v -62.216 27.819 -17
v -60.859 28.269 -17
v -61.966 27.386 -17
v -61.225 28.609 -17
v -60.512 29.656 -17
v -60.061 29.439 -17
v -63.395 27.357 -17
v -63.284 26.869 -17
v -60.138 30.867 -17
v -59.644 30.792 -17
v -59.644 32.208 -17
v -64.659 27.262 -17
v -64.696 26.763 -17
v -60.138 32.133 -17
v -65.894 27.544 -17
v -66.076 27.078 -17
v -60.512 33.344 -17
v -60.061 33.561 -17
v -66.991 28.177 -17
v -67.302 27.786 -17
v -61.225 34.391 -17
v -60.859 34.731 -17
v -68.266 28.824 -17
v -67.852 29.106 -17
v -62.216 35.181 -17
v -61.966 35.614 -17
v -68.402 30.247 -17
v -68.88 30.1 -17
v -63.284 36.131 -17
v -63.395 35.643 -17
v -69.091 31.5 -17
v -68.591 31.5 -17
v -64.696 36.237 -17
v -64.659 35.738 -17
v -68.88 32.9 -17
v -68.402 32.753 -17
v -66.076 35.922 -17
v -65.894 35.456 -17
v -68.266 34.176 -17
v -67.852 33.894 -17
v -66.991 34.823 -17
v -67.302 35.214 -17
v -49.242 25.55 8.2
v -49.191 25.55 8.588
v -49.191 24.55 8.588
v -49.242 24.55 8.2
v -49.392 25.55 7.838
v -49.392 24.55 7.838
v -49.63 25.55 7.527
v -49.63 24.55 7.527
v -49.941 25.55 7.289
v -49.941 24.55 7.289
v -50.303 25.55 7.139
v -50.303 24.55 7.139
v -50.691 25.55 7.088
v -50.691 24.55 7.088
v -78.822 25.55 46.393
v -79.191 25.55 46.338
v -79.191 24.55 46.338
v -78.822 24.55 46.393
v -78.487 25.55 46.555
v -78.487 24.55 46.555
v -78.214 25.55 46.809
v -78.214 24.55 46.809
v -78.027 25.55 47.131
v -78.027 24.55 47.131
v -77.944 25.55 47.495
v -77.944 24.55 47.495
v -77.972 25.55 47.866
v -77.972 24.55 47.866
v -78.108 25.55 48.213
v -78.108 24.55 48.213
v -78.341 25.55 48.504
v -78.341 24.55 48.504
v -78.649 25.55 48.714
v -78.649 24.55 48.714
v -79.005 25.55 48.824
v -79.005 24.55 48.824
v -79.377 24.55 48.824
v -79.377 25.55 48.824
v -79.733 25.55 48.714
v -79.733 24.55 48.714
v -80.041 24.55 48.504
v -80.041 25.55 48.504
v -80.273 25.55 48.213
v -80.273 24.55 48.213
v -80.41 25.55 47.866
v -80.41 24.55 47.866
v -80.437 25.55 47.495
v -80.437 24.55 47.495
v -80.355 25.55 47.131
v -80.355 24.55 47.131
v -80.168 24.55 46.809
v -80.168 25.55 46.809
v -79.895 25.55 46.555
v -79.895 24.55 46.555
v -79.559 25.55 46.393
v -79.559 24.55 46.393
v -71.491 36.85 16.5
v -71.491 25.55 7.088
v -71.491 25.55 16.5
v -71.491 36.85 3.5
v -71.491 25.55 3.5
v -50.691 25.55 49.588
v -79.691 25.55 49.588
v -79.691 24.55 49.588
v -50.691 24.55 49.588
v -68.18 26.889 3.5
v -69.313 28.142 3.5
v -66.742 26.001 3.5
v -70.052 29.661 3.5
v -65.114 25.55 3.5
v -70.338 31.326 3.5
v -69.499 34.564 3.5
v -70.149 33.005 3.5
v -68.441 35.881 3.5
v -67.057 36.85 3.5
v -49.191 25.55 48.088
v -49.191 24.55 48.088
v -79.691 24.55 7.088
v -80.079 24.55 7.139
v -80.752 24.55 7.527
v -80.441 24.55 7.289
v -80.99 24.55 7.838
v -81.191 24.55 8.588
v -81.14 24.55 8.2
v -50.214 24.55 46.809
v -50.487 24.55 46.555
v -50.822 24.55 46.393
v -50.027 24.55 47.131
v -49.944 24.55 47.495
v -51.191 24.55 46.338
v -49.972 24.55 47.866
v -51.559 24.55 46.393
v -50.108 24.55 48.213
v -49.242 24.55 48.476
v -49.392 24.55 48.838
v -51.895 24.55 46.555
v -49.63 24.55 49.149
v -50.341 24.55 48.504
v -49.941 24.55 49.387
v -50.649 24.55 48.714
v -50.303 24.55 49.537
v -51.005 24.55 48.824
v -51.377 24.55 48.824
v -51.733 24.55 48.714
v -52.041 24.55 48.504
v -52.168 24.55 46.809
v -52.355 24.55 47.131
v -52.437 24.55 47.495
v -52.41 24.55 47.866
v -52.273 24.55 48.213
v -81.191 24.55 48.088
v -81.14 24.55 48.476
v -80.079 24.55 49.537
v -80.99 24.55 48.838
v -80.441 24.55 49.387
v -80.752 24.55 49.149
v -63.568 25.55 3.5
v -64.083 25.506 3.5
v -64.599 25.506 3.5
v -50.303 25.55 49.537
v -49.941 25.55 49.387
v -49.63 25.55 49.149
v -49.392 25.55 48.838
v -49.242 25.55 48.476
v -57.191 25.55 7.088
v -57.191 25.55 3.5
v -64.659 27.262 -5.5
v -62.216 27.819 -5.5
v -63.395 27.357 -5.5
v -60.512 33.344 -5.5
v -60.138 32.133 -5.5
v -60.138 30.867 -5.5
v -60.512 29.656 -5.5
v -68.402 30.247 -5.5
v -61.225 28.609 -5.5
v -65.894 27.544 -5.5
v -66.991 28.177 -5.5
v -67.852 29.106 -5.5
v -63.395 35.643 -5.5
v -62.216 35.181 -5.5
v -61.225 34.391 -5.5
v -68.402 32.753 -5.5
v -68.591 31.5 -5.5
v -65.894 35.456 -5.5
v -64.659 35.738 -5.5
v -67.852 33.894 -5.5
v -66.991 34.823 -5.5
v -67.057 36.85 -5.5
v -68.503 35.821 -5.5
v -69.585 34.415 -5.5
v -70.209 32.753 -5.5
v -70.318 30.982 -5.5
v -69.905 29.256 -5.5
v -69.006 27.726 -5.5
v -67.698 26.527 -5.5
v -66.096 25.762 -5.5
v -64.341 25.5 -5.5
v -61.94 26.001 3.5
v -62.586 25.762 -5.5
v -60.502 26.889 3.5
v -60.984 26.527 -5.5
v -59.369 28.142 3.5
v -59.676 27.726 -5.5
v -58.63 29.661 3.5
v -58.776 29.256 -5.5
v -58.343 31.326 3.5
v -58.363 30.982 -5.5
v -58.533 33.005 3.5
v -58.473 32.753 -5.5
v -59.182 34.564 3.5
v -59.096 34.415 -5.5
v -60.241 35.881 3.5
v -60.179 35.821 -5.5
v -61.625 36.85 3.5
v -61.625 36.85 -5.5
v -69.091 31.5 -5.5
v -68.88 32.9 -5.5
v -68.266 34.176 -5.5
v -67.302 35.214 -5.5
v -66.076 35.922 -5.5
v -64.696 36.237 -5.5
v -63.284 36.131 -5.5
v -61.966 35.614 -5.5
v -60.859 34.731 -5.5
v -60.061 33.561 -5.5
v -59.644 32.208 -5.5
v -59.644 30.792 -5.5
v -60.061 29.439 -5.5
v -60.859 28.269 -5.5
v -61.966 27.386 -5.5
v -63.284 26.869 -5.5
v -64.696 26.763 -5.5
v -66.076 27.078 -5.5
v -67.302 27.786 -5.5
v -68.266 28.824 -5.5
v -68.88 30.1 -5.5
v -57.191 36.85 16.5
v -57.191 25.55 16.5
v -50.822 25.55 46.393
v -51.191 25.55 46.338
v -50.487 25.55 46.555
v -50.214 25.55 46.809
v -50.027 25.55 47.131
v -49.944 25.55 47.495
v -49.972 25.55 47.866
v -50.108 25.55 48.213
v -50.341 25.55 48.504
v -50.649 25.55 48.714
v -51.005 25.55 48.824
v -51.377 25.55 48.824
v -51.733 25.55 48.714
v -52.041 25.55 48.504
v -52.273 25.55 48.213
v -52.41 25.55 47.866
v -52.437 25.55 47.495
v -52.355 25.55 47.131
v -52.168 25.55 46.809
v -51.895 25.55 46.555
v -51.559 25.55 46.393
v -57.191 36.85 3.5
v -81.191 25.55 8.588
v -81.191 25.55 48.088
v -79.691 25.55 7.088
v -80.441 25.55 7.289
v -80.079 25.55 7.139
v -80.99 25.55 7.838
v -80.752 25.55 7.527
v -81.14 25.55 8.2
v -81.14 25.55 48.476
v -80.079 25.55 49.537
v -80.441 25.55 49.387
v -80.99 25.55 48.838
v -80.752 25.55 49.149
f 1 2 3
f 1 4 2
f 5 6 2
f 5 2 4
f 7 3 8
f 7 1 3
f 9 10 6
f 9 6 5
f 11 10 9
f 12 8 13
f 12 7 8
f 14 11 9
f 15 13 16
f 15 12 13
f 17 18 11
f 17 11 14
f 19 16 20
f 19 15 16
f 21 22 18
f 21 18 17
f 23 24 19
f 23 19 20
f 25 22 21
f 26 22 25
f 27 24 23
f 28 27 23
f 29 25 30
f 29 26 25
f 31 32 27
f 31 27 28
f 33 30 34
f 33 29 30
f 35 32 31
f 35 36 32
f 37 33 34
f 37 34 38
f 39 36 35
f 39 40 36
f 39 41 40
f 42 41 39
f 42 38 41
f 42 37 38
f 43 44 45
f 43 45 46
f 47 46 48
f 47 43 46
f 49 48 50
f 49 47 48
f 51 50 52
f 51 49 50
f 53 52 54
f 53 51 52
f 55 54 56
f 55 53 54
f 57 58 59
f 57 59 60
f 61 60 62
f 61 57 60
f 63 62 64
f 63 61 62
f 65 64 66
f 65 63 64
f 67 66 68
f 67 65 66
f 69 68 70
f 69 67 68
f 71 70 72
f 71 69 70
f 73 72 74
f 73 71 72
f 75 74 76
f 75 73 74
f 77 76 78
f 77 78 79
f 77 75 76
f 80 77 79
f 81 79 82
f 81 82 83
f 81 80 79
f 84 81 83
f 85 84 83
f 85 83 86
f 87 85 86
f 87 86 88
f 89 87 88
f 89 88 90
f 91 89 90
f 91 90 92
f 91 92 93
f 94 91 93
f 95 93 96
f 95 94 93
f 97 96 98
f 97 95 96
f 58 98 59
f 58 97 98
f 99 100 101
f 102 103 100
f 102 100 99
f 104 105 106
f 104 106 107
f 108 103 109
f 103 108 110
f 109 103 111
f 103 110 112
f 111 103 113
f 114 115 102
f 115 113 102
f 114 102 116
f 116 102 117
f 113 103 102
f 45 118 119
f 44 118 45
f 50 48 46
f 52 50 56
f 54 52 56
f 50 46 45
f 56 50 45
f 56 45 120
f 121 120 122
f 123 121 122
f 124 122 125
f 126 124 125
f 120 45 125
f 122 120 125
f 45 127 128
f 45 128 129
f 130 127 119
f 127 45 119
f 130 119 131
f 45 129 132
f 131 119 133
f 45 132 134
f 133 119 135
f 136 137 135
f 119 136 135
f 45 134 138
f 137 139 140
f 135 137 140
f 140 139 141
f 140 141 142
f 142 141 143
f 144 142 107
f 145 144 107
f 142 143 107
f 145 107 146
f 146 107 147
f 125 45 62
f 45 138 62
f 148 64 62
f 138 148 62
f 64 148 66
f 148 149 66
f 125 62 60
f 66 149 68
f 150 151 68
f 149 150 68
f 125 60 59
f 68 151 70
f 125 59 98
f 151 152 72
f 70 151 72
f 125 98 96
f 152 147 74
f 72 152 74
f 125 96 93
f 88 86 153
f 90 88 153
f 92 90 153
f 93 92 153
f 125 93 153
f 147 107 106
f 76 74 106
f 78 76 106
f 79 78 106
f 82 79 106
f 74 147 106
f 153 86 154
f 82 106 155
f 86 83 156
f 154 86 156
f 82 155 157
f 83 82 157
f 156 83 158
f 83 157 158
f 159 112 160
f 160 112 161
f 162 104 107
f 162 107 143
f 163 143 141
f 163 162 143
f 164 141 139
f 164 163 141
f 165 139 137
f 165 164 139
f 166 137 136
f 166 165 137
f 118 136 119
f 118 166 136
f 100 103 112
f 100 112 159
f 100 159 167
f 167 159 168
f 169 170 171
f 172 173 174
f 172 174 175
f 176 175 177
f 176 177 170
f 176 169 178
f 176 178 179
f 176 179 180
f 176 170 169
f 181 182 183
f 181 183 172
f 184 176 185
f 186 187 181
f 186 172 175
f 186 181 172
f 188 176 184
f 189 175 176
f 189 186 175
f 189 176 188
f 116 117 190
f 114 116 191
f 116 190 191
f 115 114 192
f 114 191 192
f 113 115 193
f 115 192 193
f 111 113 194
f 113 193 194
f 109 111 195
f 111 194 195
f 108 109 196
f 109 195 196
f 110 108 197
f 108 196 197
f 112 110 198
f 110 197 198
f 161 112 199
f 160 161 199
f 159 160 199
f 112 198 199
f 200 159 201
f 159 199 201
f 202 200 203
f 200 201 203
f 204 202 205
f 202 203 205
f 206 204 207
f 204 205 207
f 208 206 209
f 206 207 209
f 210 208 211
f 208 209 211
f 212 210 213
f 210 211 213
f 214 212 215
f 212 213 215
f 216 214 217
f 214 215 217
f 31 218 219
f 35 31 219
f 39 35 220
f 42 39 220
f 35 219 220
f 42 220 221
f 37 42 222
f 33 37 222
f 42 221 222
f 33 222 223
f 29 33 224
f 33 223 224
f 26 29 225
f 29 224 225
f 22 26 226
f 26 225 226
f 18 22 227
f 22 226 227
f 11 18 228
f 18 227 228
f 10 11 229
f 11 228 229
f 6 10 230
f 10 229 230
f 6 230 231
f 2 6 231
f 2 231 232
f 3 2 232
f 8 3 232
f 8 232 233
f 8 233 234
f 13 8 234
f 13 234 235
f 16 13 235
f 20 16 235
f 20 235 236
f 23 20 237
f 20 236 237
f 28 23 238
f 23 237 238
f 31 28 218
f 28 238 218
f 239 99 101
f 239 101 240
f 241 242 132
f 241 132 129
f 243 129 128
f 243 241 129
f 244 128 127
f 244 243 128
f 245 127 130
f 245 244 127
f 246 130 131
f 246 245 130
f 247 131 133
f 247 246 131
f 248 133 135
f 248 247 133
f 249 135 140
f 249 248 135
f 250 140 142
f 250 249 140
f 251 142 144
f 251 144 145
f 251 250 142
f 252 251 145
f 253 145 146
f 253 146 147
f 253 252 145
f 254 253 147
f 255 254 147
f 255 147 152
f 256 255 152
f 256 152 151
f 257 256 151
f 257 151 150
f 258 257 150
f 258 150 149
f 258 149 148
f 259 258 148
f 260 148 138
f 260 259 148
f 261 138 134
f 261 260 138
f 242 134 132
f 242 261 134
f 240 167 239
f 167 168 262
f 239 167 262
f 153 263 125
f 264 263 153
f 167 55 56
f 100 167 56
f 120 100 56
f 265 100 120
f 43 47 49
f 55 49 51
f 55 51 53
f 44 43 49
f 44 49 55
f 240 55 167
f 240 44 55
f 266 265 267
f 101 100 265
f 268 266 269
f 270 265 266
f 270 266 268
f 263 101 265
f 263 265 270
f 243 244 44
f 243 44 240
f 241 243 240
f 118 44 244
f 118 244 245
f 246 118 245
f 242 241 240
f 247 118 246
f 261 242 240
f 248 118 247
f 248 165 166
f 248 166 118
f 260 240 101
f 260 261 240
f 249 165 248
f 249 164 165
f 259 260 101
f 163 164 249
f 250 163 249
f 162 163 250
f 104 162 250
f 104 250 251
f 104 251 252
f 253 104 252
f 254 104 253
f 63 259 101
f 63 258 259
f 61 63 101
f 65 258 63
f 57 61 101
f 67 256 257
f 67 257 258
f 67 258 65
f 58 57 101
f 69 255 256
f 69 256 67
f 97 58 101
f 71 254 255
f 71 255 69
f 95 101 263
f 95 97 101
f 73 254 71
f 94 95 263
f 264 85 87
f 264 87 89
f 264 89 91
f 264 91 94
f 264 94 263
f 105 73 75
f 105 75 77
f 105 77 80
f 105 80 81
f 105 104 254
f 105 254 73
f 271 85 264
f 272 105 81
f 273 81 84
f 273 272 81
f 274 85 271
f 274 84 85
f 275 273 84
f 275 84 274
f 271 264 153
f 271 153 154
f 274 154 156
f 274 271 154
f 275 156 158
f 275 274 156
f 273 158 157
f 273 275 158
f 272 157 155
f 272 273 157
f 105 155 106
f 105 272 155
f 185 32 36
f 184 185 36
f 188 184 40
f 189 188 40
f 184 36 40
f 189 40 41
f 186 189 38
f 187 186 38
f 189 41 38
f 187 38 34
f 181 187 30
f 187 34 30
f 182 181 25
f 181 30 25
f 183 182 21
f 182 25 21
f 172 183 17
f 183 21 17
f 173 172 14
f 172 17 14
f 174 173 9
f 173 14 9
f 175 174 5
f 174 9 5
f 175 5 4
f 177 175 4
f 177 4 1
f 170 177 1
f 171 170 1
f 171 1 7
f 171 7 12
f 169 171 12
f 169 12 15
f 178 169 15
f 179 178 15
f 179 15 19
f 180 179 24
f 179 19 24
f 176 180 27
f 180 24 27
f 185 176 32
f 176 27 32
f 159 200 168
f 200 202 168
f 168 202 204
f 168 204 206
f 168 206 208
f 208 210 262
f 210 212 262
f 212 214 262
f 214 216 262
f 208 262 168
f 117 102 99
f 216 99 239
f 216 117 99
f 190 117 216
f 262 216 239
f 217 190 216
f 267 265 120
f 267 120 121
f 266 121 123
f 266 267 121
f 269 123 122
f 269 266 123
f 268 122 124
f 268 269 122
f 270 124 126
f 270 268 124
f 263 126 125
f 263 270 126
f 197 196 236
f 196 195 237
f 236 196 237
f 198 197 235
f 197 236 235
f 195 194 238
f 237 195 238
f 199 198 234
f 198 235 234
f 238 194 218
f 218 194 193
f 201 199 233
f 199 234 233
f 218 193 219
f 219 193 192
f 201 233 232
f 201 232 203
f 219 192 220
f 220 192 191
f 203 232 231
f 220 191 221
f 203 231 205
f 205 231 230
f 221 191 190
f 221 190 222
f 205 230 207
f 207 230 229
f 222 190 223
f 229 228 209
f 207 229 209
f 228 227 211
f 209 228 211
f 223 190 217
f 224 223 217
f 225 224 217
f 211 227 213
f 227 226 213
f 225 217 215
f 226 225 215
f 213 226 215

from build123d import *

# Parameters (mm, degrees)
EXTRUDE_1_DEPTH      = 3.5
EXTRUDE_1_DEPTH_BACK = 5.5
SKETCH_1_R           = 6
SKETCH_2_W           = 14.3
SKETCH_2_H           = 11.3
EXTRUDE_2_DEPTH      = 13
SKETCH_3_R           = 1.25
EXTRUDE_3_DEPTH      = 1
SKETCH_4_R           = 4.75
EXTRUDE_4_DEPTH      = 11.5
SKETCH_5_R           = 4.25
CUT_EXTRUDE_1_DEPTH  = 11.5
CUT_EXTRUDE_2_REACH  = 102.61


with BuildPart() as part:
    # 草圖1 → 填料-伸長1 (new, two sides: drawn at the far end of the back side and taken through both)
    with BuildSketch(Plane.XY.offset(-EXTRUDE_1_DEPTH_BACK)):
        with Locations((-64.340909091, 31.5)):
            Circle(SKETCH_1_R)
    extrude(amount=EXTRUDE_1_DEPTH + EXTRUDE_1_DEPTH_BACK)

    # 草圖2 → 填料-伸長2 (add)
    with BuildSketch(Plane.XY.offset(3.5)):
        with Locations((-64.340909091, 31.2)):
            Rectangle(SKETCH_2_W, SKETCH_2_H)
    extrude(amount=EXTRUDE_2_DEPTH)

    # 草圖3 → 填料-伸長3 (add)
    with BuildSketch(Plane.XZ.offset(-25.55)):
        with BuildLine():
            Line((-50.690909091, 7.087920564), (-79.690909091, 7.087920564))
            ThreePointArc((-79.690909091, 7.087920564), (-80.751569263, 7.527260393), (-81.190909091, 8.587920564))
            Line((-81.190909091, 8.587920564), (-81.190909091, 48.087920564))
            ThreePointArc((-81.190909091, 48.087920564), (-80.751569263, 49.148580736), (-79.690909091, 49.587920564))
            Line((-79.690909091, 49.587920564), (-50.690909091, 49.587920564))
            ThreePointArc((-50.690909091, 49.587920564), (-49.630248919, 49.148580736), (-49.190909091, 48.087920564))
            Line((-49.190909091, 48.087920564), (-49.190909091, 8.587920564))
            ThreePointArc((-49.190909091, 8.587920564), (-49.630248919, 7.527260393), (-50.690909091, 7.087920564))
        make_face()
        with Locations(Location((-51.190909091, 47.587920564, 0), (0, 0, 270))):
            Circle(SKETCH_3_R, mode=Mode.SUBTRACT)
        with Locations(Location((-79.190909091, 47.587920564, 0), (0, 0, 270))):
            Circle(SKETCH_3_R, mode=Mode.SUBTRACT)
    extrude(amount=EXTRUDE_3_DEPTH)

    # 草圖4 → 填料-伸長4 (add)
    with BuildSketch(Plane(origin=(0, 0, -5.5), x_dir=(-1, 0, 0), z_dir=(0, 0, -1))):
        with Locations((64.340909091, 31.5)):
            Circle(SKETCH_4_R)
    extrude(amount=EXTRUDE_4_DEPTH)

    # 草圖5 → 除料-伸長1 (cut)
    with BuildSketch(Plane(origin=(0, 0, -17), x_dir=(-1, 0, 0), z_dir=(0, 0, -1))):
        with Locations((64.340909091, 31.5)):
            Circle(SKETCH_5_R)
    extrude(amount=-CUT_EXTRUDE_1_DEPTH, mode=Mode.SUBTRACT)

    # 草圖6 → 除料-伸長2 (cut, up to next)
    with BuildSketch(Plane.XY.offset(3.5), mode=Mode.PRIVATE) as cut_extrude_2_sk1:
        with BuildLine():
            Line((-67.057064462, 36.85), (-61.62475372, 36.85))
            ThreePointArc((-61.62475372, 36.85), (-64.340909091, 37.5), (-67.057064462, 36.85))
        make_face()
    cut_extrude_2_tool1 = extrude(cut_extrude_2_sk1.sketch, amount=-CUT_EXTRUDE_2_REACH, mode=Mode.PRIVATE) & part.part
    add(cut_extrude_2_tool1.solids().sort_by_distance((-64.340909, 37.111246, 3.5))[0], mode=Mode.SUBTRACT)


solid = part.part
